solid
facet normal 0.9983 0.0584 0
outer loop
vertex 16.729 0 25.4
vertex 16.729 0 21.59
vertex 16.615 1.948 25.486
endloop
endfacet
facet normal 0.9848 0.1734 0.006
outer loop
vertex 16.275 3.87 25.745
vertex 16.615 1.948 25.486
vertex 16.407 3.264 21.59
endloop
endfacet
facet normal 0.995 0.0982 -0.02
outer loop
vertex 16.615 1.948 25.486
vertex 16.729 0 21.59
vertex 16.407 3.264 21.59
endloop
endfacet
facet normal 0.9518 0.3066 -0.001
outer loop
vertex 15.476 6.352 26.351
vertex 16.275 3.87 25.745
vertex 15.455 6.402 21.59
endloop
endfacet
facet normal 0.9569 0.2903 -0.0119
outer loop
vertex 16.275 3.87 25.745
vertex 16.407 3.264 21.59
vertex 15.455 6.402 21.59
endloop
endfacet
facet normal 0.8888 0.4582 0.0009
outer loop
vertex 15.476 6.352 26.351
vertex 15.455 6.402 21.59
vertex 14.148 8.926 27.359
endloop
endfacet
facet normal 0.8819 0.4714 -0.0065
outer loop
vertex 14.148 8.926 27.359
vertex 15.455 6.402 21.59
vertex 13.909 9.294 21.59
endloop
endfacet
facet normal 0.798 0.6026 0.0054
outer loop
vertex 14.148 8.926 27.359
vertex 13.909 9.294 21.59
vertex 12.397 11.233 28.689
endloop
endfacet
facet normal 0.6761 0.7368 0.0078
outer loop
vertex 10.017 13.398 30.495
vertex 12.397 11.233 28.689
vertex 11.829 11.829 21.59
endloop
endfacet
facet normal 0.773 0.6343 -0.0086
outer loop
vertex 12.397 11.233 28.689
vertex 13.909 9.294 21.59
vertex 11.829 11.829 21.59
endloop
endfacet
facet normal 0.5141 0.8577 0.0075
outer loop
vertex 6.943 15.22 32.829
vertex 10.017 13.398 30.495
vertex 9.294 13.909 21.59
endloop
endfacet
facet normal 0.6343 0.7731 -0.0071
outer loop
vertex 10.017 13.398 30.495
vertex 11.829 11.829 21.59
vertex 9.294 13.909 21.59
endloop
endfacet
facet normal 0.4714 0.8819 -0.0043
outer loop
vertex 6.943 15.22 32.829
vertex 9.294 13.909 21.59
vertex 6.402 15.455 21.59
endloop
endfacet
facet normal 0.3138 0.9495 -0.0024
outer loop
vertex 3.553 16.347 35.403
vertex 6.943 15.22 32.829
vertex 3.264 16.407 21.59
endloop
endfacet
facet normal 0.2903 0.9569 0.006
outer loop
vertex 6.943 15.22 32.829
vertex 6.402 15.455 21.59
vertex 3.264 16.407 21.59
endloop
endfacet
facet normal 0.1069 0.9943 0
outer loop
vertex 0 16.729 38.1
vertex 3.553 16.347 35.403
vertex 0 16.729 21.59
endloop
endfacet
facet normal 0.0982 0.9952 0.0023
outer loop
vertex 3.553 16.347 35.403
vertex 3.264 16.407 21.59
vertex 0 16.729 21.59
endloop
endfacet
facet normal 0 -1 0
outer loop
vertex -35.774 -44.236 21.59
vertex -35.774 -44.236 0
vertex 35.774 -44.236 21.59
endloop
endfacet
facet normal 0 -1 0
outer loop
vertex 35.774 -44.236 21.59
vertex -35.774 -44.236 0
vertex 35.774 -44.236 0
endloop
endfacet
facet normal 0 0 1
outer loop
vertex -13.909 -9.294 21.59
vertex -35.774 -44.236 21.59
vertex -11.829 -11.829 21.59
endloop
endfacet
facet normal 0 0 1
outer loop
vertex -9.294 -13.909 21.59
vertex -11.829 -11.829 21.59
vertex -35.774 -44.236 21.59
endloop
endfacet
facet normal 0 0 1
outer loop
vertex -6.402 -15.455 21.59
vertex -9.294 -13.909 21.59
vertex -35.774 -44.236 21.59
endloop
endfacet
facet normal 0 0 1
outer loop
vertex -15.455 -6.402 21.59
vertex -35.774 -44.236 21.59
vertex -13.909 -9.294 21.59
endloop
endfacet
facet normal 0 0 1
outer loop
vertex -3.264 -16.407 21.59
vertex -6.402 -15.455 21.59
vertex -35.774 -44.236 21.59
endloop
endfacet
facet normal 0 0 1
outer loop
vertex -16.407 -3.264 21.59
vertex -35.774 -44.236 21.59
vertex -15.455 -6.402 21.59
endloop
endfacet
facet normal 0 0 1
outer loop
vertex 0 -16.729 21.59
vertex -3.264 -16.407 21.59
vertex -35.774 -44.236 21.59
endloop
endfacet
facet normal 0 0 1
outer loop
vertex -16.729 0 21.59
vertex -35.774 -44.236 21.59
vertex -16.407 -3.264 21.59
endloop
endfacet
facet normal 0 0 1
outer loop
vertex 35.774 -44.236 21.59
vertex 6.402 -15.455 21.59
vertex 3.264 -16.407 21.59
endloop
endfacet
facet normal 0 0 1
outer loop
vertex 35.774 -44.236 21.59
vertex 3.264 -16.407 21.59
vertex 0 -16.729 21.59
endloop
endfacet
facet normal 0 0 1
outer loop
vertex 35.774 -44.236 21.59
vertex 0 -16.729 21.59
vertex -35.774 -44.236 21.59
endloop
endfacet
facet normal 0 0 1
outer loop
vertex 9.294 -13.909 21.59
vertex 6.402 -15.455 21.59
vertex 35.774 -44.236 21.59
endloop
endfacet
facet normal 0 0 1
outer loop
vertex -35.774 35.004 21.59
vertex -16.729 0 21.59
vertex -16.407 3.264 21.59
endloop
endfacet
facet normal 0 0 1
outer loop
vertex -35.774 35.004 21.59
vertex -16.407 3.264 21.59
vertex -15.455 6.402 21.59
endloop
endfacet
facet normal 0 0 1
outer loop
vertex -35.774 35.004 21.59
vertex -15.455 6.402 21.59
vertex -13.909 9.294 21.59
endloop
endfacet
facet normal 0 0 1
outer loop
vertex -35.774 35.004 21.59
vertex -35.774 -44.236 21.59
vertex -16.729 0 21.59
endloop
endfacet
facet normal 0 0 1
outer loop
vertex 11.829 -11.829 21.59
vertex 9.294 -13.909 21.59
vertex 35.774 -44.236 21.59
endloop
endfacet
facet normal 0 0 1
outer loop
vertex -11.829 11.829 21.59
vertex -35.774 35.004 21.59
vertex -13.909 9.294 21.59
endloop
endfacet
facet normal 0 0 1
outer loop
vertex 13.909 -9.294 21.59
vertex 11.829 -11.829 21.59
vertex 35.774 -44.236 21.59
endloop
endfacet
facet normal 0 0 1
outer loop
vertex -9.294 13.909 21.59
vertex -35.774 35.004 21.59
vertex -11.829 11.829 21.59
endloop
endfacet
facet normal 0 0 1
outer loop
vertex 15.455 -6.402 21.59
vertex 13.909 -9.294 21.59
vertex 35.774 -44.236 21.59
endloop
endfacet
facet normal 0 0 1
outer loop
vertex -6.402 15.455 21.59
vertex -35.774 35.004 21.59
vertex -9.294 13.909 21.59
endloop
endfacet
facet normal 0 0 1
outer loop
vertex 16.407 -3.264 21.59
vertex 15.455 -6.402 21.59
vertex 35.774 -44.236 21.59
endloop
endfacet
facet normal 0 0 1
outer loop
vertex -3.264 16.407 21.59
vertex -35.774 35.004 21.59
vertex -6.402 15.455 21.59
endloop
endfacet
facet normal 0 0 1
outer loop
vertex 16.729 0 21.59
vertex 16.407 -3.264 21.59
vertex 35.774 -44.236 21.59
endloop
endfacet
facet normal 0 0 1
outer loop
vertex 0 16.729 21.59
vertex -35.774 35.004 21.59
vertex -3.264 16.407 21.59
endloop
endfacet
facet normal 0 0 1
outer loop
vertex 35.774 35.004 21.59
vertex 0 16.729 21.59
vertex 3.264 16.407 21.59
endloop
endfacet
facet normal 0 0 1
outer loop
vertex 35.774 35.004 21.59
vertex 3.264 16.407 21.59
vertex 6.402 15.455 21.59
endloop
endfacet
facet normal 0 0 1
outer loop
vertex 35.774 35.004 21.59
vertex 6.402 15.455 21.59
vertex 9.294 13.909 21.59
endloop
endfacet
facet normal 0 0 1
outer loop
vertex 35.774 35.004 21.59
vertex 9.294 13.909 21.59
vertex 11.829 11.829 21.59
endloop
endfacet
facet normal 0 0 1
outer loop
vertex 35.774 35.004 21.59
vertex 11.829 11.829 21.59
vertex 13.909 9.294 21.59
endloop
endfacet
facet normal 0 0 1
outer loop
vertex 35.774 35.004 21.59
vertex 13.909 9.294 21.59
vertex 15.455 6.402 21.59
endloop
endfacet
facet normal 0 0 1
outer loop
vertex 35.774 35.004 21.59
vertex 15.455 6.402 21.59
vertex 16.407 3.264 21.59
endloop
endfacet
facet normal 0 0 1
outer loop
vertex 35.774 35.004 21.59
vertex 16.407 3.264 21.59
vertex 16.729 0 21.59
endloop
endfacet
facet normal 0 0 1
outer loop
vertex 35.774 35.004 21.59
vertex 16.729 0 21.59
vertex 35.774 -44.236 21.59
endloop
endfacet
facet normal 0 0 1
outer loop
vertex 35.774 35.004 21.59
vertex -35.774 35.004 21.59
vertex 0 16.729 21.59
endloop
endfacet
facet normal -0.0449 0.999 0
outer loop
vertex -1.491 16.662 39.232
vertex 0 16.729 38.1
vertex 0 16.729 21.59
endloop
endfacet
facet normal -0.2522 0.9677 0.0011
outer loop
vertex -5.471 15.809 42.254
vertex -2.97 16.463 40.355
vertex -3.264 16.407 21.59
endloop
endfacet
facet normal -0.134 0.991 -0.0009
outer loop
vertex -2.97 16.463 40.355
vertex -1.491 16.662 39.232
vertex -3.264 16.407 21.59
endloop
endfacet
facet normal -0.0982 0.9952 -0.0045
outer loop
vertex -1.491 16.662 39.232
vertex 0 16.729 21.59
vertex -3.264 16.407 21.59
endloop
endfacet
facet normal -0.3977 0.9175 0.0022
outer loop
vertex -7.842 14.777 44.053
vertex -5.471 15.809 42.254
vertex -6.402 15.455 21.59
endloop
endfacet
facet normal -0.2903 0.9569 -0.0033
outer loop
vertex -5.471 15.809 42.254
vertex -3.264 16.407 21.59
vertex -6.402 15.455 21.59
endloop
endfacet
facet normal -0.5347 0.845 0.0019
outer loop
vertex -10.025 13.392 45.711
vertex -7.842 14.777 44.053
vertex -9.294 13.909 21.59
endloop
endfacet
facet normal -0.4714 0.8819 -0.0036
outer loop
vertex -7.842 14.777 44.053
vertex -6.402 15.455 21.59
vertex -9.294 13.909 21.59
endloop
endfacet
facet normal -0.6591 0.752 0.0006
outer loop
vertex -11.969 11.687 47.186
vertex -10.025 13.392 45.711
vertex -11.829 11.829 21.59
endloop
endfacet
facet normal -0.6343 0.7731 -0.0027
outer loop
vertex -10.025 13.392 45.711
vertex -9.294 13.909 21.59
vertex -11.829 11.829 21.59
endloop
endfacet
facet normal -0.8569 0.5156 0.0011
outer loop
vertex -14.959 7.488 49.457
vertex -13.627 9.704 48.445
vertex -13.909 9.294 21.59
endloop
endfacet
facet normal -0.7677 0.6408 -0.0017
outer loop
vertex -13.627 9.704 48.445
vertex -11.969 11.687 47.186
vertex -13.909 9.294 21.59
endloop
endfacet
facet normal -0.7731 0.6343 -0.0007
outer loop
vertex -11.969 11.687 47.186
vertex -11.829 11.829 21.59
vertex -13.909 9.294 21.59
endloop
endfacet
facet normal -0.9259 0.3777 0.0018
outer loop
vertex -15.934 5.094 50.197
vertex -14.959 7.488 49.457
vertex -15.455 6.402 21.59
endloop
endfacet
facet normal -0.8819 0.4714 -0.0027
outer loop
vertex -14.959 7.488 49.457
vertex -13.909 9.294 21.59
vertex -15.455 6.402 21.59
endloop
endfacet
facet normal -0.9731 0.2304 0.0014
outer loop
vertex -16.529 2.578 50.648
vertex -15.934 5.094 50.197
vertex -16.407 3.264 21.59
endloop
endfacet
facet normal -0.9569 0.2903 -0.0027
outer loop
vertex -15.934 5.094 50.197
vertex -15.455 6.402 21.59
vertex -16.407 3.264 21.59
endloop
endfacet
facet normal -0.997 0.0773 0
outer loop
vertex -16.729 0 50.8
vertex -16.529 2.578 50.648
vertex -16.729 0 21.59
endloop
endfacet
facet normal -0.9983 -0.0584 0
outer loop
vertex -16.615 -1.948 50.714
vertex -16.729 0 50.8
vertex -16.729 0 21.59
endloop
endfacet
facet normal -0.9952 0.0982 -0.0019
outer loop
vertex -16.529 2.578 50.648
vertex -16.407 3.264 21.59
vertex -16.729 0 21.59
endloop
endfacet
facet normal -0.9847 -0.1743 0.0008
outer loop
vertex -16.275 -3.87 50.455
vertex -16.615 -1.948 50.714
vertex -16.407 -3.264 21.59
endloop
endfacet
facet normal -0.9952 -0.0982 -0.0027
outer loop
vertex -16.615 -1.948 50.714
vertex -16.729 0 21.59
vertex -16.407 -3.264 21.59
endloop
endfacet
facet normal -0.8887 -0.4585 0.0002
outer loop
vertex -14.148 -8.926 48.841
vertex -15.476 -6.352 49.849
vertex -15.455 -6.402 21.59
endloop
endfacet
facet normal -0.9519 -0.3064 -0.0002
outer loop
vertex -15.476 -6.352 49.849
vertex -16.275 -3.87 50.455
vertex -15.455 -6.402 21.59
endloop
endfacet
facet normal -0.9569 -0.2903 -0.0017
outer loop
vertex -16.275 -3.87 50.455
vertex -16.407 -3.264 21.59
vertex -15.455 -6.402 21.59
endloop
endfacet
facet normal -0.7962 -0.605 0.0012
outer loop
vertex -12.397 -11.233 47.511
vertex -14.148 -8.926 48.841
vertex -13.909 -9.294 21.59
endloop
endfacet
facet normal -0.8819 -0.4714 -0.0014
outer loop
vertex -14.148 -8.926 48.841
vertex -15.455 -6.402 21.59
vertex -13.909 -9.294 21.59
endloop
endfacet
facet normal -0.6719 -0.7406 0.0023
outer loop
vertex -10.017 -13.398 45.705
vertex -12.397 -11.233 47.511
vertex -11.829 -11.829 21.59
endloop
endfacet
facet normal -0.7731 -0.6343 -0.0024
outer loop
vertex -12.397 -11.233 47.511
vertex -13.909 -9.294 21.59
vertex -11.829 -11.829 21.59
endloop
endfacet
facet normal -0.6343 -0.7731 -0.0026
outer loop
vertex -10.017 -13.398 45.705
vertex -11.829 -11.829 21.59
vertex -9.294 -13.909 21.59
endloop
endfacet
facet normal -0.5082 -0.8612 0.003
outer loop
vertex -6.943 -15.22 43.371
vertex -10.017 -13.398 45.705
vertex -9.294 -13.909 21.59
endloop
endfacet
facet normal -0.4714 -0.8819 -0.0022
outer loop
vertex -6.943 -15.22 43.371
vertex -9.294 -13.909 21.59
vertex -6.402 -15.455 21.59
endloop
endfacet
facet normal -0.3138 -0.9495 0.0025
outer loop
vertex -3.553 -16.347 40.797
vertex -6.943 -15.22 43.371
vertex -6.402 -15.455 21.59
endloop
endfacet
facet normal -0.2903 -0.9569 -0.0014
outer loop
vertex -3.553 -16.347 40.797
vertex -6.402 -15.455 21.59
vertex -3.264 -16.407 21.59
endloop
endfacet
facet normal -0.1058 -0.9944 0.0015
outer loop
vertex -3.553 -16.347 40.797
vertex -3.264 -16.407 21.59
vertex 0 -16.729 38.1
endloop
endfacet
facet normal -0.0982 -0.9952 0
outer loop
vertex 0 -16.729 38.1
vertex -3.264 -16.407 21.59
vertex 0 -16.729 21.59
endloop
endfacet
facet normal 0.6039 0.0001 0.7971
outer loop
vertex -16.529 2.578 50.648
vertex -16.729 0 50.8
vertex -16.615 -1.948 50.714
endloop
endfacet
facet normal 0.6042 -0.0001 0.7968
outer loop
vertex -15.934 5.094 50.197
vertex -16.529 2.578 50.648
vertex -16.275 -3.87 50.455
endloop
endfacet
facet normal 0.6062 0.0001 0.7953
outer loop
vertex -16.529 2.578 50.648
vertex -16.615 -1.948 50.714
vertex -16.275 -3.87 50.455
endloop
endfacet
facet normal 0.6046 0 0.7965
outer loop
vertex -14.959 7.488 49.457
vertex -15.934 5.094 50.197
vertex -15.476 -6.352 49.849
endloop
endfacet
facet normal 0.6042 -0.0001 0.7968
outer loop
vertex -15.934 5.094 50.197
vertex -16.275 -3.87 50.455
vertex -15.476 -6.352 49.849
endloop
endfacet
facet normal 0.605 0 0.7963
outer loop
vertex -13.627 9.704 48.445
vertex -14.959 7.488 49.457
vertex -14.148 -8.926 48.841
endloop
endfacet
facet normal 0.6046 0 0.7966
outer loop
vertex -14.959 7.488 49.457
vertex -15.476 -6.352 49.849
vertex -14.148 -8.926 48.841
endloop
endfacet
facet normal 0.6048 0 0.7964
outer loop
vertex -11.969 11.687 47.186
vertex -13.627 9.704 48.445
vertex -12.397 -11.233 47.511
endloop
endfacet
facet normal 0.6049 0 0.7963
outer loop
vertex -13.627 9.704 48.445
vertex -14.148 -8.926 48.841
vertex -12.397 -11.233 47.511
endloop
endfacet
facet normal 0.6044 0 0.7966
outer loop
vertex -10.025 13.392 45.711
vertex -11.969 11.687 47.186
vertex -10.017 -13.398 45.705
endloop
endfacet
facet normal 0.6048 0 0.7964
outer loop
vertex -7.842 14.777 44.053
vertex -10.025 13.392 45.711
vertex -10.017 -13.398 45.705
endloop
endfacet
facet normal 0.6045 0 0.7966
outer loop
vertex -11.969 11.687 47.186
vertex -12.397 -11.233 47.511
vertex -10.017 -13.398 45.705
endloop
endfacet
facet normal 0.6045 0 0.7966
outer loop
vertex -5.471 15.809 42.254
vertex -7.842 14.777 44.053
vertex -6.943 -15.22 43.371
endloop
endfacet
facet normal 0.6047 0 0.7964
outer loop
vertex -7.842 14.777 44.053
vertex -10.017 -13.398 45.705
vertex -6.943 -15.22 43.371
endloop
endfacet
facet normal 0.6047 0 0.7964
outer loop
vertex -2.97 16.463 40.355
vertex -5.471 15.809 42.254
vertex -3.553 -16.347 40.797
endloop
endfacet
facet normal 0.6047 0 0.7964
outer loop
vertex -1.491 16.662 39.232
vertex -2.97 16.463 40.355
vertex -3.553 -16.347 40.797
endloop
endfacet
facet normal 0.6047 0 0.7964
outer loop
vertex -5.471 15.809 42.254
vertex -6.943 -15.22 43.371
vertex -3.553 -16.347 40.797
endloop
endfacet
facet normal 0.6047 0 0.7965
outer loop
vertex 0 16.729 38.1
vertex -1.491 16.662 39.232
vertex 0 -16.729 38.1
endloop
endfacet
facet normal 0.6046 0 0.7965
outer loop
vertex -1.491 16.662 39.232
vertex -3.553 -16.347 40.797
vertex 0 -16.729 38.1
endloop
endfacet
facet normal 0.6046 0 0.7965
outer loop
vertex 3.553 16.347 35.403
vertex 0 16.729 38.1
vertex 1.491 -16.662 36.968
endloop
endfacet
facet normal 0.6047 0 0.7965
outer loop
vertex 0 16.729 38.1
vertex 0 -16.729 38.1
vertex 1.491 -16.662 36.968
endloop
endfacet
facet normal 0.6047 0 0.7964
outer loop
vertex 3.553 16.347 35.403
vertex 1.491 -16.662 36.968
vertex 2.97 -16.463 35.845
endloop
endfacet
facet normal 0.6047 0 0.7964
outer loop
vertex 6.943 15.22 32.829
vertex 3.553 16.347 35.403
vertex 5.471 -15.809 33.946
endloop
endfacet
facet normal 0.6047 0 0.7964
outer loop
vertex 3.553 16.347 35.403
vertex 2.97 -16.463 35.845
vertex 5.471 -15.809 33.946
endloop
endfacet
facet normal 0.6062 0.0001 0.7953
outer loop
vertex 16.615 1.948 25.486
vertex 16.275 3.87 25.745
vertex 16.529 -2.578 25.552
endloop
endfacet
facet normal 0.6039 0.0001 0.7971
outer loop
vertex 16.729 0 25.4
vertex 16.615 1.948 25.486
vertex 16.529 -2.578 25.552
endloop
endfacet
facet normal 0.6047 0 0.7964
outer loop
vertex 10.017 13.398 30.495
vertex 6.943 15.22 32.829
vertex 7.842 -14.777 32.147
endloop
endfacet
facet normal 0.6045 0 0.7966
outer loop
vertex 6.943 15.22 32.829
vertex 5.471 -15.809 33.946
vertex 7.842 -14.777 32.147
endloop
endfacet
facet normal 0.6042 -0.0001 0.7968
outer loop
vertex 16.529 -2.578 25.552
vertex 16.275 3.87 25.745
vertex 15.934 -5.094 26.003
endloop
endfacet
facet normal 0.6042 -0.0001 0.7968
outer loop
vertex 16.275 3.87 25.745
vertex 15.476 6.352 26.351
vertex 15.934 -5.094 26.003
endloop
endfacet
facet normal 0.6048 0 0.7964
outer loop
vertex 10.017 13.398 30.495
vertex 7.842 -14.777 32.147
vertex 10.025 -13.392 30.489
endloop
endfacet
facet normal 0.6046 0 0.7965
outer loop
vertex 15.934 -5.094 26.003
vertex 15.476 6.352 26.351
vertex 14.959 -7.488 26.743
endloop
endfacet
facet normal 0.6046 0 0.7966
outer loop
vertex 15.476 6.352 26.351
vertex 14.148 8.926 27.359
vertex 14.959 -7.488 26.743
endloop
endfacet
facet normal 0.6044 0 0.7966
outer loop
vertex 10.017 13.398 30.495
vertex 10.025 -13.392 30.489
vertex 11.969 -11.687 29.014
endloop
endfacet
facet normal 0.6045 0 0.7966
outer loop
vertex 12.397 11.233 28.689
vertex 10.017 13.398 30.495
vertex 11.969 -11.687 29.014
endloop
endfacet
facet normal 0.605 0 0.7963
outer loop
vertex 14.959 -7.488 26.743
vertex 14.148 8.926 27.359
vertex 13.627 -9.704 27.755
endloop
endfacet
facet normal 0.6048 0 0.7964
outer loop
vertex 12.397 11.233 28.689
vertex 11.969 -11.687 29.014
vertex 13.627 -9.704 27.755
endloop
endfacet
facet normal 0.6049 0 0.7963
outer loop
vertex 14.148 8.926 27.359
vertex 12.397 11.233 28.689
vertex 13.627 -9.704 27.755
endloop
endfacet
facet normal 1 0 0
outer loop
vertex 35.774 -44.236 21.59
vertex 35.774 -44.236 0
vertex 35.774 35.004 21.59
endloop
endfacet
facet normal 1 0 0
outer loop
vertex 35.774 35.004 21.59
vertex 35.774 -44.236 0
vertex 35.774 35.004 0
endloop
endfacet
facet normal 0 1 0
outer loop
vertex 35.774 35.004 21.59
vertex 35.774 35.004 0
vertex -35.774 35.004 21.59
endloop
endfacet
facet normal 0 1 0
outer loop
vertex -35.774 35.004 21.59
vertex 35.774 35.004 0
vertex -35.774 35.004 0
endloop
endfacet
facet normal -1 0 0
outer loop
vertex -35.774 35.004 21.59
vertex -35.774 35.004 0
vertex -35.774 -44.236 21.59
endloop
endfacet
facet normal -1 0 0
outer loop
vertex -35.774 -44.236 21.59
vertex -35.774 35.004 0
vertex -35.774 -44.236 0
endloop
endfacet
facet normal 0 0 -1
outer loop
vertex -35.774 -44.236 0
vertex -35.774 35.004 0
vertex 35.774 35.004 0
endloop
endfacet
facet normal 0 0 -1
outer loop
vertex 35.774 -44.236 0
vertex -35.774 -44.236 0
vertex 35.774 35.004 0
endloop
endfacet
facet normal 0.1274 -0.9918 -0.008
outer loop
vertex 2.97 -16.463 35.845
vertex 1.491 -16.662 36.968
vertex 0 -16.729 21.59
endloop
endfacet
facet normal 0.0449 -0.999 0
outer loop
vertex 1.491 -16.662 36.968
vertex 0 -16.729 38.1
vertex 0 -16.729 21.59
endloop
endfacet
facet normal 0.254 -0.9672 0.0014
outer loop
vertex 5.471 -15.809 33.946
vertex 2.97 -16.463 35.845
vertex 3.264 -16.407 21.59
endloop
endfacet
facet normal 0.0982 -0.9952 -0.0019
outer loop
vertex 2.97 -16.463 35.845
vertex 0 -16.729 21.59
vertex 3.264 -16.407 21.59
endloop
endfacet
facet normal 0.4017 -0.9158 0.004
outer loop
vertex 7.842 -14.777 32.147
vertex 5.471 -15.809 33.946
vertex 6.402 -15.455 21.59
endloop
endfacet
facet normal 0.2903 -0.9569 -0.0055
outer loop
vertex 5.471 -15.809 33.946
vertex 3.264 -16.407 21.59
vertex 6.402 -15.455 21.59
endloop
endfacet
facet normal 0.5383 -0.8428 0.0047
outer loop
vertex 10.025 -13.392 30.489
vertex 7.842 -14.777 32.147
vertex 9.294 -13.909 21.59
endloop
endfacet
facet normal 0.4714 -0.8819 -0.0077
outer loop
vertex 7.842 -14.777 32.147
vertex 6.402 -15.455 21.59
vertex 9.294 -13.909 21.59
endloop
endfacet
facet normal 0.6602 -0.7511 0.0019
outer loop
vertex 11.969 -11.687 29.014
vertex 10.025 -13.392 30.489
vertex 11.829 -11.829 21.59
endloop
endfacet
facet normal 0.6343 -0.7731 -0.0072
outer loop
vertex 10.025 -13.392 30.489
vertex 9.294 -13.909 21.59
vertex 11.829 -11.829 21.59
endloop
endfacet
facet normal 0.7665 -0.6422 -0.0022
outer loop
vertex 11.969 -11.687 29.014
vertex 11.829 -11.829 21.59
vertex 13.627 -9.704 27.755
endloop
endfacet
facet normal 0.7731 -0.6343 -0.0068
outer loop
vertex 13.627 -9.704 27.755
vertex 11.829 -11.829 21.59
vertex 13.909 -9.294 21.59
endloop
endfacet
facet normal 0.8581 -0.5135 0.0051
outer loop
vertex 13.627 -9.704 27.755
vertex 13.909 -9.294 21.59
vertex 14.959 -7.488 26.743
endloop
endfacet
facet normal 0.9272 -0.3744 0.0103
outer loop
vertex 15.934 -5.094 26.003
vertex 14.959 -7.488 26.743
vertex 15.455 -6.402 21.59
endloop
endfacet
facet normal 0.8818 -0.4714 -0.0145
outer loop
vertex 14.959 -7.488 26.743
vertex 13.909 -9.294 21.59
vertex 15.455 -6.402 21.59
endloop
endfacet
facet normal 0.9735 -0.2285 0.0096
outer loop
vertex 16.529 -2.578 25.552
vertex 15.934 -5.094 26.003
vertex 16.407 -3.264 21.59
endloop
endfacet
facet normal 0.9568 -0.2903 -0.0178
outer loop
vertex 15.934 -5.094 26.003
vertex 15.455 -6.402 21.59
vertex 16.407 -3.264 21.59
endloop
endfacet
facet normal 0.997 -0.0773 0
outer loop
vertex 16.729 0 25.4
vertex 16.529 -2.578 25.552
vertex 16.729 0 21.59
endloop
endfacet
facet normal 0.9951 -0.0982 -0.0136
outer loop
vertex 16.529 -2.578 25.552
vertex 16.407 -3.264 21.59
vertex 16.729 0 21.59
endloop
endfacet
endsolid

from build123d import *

# Parameters (mm, degrees)
F1_DEPTH = 50.8
F2_DEPTH = 21.59
F4_DEPTH = 79.241672


with BuildPart() as f1:
    # F0 (on Top) → F1 (new body)
    with BuildSketch(Plane.XY):
        with BuildLine():
            ThreePointArc((0, -16.728577), (11.82889, -11.82889), (16.728577, 0))
            ThreePointArc((16.728577, 0), (11.82889, 11.82889), (0, 16.728577))
            Line((0, 16.728577), (0, -16.728577))
        make_face()
        with BuildLine():
            Line((0, -16.728577), (0, 16.728577))
            ThreePointArc((0, 16.728577), (-16.728577, 0), (0, -16.728577))
        make_face()
    extrude(amount=F1_DEPTH)

    # F0 (on Top) → F2 (join)
    with BuildSketch(Plane.XY):
        with BuildLine():
            ThreePointArc((0, -16.728577), (-16.728577, 0), (0, 16.728577))
            Line((0, 16.728577), (0, 35.004374))
            Line((0, 35.004374), (-35.773702, 35.004374))
            Line((-35.773702, 35.004374), (-35.773702, -44.236299))
            Line((-35.773702, -44.236299), (0, -44.236299))
            Line((0, -44.236299), (0, -16.728577))
        make_face()
        with BuildLine():
            ThreePointArc((0, 16.728577), (11.82889, 11.82889), (16.728577, 0))
            ThreePointArc((16.728577, 0), (11.82889, -11.82889), (0, -16.728577))
            Line((0, -16.728577), (0, -44.236299))
            Line((0, -44.236299), (35.773702, -44.236299))
            Line((35.773702, -44.236299), (35.773702, 35.004374))
            Line((35.773702, 35.004374), (0, 35.004374))
            Line((0, 35.004374), (0, 16.728577))
        make_face()
    extrude(amount=F2_DEPTH)

    # F3 (on face) → F4 (cut, through all)
    with BuildSketch(Plane.XZ.offset(44.236299)):
        Polygon((16.728577, 50.8), (-16.728577, 50.8), (16.728577, 25.4), align=None)
    extrude(amount=-F4_DEPTH, mode=Mode.SUBTRACT)


solid = f1.part
